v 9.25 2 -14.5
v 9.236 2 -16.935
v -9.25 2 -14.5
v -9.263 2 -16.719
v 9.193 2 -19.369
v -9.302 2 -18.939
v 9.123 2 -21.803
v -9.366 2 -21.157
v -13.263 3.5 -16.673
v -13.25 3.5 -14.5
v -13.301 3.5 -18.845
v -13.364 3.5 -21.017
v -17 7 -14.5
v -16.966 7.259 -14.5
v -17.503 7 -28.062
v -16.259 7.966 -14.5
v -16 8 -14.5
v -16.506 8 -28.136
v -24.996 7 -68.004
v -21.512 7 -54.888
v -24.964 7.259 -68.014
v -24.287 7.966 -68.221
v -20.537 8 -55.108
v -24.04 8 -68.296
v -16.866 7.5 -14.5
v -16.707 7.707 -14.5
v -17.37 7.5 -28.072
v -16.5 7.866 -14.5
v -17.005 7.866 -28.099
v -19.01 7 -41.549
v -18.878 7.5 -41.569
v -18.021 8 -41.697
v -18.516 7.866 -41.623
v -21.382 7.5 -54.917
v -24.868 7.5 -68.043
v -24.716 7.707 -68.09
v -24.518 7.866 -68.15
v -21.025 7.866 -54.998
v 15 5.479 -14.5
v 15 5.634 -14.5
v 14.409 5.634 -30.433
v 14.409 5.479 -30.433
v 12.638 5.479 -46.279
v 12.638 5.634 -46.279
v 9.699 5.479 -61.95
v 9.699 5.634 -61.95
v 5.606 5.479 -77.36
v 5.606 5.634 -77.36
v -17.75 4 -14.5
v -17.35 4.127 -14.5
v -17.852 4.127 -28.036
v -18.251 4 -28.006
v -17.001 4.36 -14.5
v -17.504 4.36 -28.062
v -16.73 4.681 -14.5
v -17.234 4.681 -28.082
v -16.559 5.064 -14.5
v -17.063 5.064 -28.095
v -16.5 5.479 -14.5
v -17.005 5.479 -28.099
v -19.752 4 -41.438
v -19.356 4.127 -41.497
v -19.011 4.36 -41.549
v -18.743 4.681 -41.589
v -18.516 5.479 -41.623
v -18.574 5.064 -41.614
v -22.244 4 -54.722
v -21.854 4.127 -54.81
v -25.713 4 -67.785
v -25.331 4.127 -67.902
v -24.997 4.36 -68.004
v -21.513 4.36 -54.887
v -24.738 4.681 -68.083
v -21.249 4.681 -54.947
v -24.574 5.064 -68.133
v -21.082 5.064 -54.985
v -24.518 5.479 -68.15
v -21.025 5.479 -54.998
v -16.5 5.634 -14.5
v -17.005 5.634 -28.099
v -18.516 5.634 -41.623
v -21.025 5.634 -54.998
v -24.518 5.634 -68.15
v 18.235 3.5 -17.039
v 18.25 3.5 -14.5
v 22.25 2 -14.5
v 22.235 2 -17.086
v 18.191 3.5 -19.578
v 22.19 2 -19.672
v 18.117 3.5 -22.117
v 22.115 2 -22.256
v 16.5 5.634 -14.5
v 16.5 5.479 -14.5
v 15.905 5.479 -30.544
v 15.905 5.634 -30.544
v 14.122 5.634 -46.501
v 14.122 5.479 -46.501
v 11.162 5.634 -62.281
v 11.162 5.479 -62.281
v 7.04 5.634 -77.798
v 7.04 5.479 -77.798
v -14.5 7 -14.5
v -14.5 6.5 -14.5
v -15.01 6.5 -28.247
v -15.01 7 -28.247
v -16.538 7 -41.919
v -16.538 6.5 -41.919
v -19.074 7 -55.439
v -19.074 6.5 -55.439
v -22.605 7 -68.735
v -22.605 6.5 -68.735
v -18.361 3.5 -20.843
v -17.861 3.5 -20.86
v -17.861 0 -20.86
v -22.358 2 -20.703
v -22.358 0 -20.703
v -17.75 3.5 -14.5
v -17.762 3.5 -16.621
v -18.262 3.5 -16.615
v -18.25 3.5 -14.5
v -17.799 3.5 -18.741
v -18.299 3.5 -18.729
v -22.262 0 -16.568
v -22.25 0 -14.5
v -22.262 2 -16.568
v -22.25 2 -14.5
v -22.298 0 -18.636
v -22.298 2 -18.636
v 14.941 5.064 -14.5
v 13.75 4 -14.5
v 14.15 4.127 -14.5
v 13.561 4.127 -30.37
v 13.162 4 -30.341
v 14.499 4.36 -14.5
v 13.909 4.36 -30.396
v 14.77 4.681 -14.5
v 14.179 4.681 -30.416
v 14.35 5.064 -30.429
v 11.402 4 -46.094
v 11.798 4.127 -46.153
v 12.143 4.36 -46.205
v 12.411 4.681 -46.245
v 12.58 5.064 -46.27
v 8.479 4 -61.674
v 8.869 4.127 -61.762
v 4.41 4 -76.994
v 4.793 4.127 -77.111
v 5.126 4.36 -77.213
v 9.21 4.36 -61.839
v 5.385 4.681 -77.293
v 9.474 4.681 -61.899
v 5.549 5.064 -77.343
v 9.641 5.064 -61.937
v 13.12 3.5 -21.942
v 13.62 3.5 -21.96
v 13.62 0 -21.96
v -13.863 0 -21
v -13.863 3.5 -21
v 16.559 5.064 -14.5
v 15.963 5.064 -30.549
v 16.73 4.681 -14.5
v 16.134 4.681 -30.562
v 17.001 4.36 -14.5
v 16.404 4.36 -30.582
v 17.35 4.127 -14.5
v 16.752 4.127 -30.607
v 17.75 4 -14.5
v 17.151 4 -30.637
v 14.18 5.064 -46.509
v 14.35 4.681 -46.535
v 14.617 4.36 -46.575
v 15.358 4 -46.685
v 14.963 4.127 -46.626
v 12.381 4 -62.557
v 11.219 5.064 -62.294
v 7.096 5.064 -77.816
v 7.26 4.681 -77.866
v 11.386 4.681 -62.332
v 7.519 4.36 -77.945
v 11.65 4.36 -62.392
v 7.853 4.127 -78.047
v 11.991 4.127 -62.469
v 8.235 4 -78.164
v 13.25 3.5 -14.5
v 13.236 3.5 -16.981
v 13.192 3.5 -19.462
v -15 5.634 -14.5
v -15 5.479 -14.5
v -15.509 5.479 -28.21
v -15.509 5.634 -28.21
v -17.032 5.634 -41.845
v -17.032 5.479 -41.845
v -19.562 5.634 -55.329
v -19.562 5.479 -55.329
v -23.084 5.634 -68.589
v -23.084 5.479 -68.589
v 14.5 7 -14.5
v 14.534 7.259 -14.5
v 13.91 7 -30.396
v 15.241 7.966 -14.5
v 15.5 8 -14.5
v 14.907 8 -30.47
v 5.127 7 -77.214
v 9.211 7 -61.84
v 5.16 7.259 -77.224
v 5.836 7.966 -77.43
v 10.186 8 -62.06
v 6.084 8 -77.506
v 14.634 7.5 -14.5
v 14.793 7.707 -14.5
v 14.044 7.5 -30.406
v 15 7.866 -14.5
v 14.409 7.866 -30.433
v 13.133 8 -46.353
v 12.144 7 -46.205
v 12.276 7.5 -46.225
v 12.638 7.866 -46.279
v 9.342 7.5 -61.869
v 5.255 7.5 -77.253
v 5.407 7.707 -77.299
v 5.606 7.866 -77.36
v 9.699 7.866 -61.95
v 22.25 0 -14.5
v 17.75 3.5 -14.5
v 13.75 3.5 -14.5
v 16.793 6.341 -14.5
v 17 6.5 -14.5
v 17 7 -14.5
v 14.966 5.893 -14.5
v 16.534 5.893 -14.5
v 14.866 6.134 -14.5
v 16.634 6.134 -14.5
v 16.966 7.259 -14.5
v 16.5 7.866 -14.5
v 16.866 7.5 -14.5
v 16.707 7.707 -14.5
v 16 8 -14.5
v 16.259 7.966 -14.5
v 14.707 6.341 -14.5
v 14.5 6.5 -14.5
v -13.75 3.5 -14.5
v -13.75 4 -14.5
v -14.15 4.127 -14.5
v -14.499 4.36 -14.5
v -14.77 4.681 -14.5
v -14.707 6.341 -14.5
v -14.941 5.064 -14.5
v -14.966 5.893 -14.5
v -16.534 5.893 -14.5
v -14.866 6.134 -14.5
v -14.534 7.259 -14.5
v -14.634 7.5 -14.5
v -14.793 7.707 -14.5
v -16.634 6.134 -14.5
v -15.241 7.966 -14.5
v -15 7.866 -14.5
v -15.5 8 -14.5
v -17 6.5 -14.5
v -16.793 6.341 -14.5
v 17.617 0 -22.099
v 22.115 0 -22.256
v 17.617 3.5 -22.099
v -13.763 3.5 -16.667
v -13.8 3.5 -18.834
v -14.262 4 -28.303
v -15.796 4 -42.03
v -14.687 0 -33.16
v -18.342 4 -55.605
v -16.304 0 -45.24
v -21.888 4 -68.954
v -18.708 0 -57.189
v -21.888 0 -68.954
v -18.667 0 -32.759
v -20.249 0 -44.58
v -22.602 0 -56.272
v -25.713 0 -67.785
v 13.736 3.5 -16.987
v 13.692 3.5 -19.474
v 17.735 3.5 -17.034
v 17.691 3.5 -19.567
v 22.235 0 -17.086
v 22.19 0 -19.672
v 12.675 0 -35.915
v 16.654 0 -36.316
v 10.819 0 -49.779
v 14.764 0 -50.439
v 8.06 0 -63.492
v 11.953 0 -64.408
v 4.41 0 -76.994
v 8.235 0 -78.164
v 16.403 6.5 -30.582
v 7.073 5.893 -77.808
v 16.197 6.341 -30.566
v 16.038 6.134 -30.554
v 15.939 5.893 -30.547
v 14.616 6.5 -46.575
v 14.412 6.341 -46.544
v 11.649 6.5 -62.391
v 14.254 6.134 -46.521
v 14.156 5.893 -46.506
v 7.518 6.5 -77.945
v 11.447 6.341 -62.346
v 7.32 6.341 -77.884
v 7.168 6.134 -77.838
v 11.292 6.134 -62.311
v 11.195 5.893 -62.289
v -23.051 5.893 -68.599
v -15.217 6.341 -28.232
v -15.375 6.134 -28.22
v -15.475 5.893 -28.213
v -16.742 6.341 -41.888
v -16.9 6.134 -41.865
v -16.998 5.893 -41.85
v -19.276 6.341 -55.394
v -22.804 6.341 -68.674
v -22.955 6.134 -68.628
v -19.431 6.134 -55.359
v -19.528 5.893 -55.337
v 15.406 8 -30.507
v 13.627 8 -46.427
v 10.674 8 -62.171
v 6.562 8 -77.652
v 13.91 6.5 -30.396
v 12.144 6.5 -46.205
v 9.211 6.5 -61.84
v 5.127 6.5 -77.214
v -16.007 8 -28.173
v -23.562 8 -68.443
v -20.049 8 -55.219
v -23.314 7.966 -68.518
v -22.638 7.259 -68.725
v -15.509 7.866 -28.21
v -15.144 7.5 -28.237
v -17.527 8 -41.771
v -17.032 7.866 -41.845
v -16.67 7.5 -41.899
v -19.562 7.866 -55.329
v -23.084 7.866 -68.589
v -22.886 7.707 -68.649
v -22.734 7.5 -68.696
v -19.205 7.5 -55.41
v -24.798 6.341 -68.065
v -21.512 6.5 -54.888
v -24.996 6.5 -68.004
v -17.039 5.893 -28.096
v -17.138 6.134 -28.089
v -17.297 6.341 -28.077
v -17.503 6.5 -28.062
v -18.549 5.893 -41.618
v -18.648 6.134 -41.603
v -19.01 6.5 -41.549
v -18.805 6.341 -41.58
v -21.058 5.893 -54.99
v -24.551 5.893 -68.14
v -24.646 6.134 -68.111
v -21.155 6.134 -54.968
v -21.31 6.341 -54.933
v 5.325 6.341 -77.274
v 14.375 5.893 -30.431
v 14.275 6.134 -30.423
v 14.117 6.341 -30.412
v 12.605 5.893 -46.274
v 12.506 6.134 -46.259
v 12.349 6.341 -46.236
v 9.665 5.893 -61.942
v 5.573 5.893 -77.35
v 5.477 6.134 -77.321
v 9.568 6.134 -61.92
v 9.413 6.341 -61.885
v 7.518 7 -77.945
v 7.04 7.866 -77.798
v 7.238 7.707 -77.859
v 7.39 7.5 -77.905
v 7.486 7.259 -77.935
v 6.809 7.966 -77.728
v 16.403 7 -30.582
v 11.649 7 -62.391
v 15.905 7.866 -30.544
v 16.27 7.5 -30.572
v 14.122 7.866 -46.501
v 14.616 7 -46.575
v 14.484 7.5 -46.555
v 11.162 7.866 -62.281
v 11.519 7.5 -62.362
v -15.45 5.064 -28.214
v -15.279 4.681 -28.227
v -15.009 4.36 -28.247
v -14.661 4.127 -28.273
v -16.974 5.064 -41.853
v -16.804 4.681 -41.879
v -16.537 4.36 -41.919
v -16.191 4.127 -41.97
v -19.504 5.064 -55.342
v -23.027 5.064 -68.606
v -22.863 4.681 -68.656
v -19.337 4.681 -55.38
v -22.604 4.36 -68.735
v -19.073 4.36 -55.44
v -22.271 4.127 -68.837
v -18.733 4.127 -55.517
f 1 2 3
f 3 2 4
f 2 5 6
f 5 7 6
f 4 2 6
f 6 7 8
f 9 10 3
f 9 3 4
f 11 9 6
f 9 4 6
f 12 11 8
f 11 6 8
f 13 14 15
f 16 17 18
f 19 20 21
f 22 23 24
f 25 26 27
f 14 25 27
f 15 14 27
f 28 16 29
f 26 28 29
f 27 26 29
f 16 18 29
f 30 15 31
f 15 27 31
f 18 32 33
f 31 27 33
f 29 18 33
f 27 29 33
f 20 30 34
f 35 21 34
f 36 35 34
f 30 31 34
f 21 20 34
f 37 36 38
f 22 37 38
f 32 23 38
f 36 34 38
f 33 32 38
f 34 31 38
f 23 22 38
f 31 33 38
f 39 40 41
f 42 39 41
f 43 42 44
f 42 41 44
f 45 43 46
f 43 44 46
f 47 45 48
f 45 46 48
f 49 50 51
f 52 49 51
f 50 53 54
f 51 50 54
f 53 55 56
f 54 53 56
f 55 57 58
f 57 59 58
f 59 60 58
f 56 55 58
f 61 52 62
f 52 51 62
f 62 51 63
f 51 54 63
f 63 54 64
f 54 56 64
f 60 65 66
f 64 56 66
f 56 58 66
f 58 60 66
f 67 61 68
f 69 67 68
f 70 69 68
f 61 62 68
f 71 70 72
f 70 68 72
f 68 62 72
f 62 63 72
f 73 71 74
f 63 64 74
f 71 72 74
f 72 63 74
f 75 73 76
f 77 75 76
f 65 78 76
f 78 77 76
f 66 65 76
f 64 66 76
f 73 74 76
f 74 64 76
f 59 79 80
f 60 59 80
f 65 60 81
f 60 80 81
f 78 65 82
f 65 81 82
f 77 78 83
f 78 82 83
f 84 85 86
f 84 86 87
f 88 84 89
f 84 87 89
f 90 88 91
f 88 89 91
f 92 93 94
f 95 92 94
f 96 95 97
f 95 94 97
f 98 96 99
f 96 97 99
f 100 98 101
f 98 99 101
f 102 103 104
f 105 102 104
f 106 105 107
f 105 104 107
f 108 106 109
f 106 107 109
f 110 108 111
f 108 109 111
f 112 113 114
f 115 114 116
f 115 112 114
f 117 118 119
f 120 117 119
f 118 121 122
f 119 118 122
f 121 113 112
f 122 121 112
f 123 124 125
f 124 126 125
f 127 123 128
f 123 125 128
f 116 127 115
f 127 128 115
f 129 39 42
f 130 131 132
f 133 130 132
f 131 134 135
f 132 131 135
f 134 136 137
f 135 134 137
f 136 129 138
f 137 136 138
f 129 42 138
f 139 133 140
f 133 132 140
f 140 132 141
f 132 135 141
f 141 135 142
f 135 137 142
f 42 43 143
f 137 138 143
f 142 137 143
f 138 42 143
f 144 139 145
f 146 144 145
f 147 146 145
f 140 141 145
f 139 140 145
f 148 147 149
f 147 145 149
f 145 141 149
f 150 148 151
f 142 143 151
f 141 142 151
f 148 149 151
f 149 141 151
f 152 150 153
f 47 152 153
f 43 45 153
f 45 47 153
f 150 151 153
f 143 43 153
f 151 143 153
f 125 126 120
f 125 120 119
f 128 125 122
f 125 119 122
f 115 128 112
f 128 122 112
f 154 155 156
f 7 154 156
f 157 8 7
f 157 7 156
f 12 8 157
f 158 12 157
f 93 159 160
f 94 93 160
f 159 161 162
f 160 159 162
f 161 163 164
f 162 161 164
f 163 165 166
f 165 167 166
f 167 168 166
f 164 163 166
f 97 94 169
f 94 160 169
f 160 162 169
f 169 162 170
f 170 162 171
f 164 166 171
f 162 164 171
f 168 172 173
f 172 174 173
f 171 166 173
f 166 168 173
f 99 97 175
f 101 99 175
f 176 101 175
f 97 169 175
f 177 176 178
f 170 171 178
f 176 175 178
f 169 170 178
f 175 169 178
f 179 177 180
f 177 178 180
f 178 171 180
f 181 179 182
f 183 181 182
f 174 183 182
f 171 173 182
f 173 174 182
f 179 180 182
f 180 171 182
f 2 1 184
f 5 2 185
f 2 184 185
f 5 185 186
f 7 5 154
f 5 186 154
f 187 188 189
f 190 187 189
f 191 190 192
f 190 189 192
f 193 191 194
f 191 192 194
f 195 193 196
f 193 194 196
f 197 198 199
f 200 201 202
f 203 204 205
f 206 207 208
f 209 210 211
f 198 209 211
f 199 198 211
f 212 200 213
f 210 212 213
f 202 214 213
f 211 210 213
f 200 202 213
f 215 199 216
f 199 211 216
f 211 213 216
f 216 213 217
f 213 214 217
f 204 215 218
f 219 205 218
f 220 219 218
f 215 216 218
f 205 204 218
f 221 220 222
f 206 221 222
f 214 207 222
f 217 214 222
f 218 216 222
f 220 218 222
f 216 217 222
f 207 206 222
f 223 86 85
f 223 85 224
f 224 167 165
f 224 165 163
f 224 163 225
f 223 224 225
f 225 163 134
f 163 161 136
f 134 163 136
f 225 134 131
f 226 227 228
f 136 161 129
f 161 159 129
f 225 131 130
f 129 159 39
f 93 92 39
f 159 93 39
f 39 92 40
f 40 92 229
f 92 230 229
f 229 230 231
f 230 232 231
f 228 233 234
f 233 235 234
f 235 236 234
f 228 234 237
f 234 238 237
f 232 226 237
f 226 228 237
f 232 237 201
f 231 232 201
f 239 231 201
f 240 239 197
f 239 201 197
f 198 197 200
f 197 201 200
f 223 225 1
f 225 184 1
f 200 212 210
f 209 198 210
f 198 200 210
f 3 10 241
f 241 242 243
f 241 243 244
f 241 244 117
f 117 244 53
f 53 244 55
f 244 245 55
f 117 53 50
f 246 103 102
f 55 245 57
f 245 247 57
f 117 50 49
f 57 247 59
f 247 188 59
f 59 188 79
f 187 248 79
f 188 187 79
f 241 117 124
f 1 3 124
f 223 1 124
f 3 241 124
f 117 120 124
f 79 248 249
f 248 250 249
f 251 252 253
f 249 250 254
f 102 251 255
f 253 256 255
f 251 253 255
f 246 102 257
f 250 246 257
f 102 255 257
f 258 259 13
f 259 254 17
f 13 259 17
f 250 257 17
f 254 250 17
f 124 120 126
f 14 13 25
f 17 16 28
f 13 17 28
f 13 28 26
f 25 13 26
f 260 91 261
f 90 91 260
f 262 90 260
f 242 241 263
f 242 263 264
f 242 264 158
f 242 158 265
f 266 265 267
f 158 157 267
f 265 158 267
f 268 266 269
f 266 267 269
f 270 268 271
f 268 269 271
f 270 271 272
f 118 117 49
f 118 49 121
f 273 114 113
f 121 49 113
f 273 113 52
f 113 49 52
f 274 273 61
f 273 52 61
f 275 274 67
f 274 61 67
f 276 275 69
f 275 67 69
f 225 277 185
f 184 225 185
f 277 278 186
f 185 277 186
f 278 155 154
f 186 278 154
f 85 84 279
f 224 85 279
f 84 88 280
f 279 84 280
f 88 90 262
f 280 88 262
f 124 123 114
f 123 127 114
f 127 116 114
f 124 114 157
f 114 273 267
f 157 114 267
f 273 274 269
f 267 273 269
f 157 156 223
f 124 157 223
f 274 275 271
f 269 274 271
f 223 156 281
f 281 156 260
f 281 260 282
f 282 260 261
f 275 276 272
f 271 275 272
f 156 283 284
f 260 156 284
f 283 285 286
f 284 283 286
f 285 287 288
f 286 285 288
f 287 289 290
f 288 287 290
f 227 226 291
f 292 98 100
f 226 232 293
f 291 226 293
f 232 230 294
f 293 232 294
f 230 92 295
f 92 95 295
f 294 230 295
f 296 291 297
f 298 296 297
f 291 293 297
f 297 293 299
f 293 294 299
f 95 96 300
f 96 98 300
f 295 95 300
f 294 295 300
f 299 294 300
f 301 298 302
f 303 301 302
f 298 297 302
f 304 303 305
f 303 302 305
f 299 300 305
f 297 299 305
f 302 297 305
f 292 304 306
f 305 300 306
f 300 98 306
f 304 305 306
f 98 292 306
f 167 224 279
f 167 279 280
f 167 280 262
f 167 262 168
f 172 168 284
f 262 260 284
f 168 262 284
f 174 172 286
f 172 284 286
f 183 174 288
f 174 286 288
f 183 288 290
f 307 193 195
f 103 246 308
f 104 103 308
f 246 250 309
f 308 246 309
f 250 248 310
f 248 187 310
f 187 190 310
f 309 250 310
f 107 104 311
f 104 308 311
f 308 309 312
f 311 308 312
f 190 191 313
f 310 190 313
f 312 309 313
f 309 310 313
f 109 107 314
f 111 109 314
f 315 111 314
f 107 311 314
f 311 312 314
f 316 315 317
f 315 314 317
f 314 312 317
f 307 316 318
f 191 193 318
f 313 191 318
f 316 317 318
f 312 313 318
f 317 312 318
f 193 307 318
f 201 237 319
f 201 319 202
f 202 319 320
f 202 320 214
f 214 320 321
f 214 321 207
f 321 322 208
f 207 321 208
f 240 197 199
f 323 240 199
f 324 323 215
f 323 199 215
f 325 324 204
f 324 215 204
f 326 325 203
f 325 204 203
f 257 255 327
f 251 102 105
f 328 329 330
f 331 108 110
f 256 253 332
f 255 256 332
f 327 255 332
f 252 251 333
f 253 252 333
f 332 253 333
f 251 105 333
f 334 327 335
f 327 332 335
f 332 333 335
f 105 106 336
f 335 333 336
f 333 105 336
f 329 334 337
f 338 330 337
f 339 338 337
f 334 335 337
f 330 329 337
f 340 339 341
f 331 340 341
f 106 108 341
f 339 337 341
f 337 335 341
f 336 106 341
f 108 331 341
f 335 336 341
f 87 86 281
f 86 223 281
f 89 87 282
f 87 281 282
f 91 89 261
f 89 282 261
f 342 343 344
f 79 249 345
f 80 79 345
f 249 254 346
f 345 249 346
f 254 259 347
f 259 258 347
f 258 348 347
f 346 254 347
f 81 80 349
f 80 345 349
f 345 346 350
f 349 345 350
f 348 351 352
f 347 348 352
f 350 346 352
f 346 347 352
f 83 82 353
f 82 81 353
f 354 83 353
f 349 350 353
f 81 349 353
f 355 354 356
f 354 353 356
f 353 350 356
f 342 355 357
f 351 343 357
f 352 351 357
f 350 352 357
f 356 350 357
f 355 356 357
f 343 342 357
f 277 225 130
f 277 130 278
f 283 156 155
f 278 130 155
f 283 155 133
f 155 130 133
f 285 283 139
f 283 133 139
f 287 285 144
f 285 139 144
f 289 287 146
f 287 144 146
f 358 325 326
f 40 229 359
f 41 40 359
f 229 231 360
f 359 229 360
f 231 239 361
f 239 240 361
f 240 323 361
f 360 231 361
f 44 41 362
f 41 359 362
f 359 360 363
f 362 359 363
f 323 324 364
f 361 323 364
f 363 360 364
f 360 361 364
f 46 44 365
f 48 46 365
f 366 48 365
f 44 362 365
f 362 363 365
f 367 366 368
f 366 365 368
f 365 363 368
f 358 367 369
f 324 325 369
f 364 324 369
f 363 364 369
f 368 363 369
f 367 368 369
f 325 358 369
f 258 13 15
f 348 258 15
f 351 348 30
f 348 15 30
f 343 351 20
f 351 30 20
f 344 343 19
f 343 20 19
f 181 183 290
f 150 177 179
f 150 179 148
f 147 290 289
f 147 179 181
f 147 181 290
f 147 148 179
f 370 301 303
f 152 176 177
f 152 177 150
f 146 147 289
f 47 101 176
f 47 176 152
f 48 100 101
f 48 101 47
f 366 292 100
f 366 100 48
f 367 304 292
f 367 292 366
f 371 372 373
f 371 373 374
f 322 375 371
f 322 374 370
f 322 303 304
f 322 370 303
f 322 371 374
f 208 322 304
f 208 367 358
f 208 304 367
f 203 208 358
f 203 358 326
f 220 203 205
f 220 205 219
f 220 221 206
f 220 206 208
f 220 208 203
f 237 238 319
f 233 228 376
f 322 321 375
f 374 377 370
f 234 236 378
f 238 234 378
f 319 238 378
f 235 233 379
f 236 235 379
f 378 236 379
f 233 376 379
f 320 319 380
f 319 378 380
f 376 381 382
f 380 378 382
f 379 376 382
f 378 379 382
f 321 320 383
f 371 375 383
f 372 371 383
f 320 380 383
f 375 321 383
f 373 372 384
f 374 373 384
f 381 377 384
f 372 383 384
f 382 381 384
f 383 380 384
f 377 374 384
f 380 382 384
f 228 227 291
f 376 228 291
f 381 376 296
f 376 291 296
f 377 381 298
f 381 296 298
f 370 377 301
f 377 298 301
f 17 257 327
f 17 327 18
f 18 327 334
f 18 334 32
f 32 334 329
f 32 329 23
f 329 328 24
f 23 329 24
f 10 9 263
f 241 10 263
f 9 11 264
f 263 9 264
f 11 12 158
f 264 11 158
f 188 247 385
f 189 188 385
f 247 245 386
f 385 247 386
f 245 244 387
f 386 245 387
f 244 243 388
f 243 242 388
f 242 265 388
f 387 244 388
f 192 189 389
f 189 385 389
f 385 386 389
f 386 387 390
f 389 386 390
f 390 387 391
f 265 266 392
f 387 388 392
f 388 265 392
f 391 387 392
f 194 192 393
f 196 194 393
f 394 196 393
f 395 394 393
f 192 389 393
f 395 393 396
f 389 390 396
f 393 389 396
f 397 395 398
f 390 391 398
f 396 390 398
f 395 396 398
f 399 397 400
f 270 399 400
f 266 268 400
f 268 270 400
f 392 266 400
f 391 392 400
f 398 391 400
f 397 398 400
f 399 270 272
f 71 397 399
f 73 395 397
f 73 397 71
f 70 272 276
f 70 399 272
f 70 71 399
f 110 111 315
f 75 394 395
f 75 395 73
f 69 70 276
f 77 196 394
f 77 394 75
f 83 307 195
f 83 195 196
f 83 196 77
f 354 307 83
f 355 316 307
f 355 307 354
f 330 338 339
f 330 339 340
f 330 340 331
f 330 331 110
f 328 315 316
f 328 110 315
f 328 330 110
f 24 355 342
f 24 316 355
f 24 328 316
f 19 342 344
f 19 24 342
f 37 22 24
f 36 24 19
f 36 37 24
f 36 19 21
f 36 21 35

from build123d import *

# Parameters (mm, degrees)
SKETCH_1_W          = 4
SKETCH_1_H          = 21
SKETCH_1_H_2        = 8
EXTRUDE_1_DEPTH     = 4
SKETCH_1_7_W        = 44.5
SKETCH_1_7_H        = 8
EXTRUDE_2_DEPTH     = 3.5
SKETCH_2_W          = 18.5
SKETCH_2_H          = 1.5
CUT_EXTRUDE_1_DEPTH = 37.7704025
SKETCH_2_3_W        = 2.5
SKETCH_2_3_H        = 1.5
EXTRUDE_4_DEPTH     = 29
FILLET_1_R          = 1
FILLET_2_R          = 1.5
FILLET_3_R          = 1
REVOLVE_2_ANGLE     = 17
CUT_EXTRUDE_5_DEPTH = 70.125096927
REVOLVE_1_ANGLE     = 2


with BuildPart() as part:
    # 草图1 → 凸台-拉伸1 (new body)
    with BuildSketch(Plane(origin=(0, 0, 0), x_dir=(1, 0, 0), z_dir=(0, 1, 0))):
        with Locations((-15.75, -4)):
            Rectangle(SKETCH_1_W, SKETCH_1_H)
        with Locations((15.75, -4)):
            Rectangle(SKETCH_1_W, SKETCH_1_H)
        with Locations((15.75, 10.5)):
            Rectangle(SKETCH_1_W, SKETCH_1_H_2)
        with Locations((-15.75, 10.5)):
            Rectangle(SKETCH_1_W, SKETCH_1_H_2)
    extrude(amount=EXTRUDE_1_DEPTH)

    # 草图1<7> → 凸台-拉伸2 (add)
    with BuildSketch(Plane(origin=(0, 0, 0), x_dir=(1, 0, 0), z_dir=(0, 1, 0))):
        with Locations((0, 10.5)):
            Rectangle(SKETCH_1_7_W, SKETCH_1_7_H)
    extrude(amount=EXTRUDE_2_DEPTH)

    # 草图2 → 切除-拉伸1 (cut, through all)
    with BuildSketch(Plane(origin=(0, 0, -14.5), x_dir=(-1, 0, 0), z_dir=(0, 0, -1))):
        with Locations((0, 2.75)):
            Rectangle(SKETCH_2_W, SKETCH_2_H)
        Polygon((13.25, 3.5), (9.25, 3.5), (9.25, 2), align=None)
        Polygon((-9.25, 3.5), (-13.25, 3.5), (-9.25, 2), align=None)
        Polygon((-22.25, 3.5), (-22.25, 2), (-18.25, 3.5), align=None)
        Polygon((22.25, 3.5), (18.25, 3.5), (22.25, 2), align=None)
    extrude(amount=-CUT_EXTRUDE_1_DEPTH, mode=Mode.SUBTRACT)

    # 草图2<3> → 凸台-拉伸4 (add, through all)
    with BuildSketch(Plane(origin=(0, 0, -14.5), x_dir=(-1, 0, 0), z_dir=(0, 0, -1))):
        with Locations((-15.75, 7.25)):
            Rectangle(SKETCH_2_3_W, SKETCH_2_3_H)
        Polygon((-15, 6.5), (-16.5, 6.5), (-16.5, 4), (-15.75, 4), (-15, 4), align=None)
        with Locations((15.75, 7.25)):
            Rectangle(SKETCH_2_3_W, SKETCH_2_3_H)
        Polygon((16.5, 6.5), (15, 6.5), (15, 4), (15.75, 4), (16.5, 4), align=None)
    extrude(amount=-EXTRUDE_4_DEPTH)

    # 圆角1
    # the kernel refuses this fillet: 1 mm, written as the material it adds along each edge
    with BuildSketch(Plane(origin=(-16.5, 6.5, -14.5), x_dir=(-1, 0, 0), z_dir=(0, 0, 1)), Plane(origin=(15, 6.5, -14.5), x_dir=(-1, 0, 0), z_dir=(0, 0, 1))) as fillet_1_piece_1:
        with BuildLine():
            CenterArc((1, 0.866025404), FILLET_1_R, 180, 60)
            Line((0, 0.866025404), (-0.02, 0.866025404))
            Line((-0.02, 0.866025404), (-0.02, 0))
            Line((-0.02, 0), (0, -0.02))
            ThreePointArc((0, -0.02), (0.25, -0.02), (0.49, -0.017320508))
            Line((0.49, -0.017320508), (0.5, 0))
        make_face()
    extrude(amount=29)
    with BuildSketch(Plane(origin=(-15, 6.5, -14.5), x_dir=(0, -1, 0), z_dir=(0, 0, 1)), Plane(origin=(16.5, 6.5, -14.5), x_dir=(0, -1, 0), z_dir=(0, 0, 1))) as fillet_1_piece_2:
        with BuildLine():
            CenterArc((0.866025404, 1), FILLET_1_R, 210, 60)
            Line((0, 0.5), (-0.017320508, 0.49))
            ThreePointArc((-0.017320508, 0.49), (-0.02, 0.25), (-0.02, 0))
            Line((-0.02, 0), (0, -0.02))
            Line((0, -0.02), (0.866025404, -0.02))
            Line((0.866025404, -0.02), (0.866025404, 0))
        make_face()
    extrude(amount=29)

    # 圆角2
    # the kernel refuses this fillet: 1.5 mm, written as the material it adds along each edge
    with BuildSketch(Plane(origin=(16.5, 4, -14.5), x_dir=(1, 0, 0), z_dir=(0, 0, 1))) as fillet_2_piece_1:
        with BuildLine():
            CenterArc((1.5, 1.479019946), FILLET_2_R, 180, 80.405931773)
            Line((0, 1.479019946), (-0.03, 1.479019946))
            Line((-0.03, 1.479019946), (-0.03, 0))
            Line((-0.03, 0), (0, -0.03))
            ThreePointArc((0, -0.03), (0.625, -0.03), (1.245, -0.029580399))
            Line((1.245, -0.029580399), (1.25, 0))
        make_face()
    extrude(amount=29)
    with BuildSketch(Plane(origin=(15, 4, -14.5), x_dir=(0, 1, 0), z_dir=(0, 0, 1)), Plane(origin=(-16.5, 4, -14.5), x_dir=(0, 1, 0), z_dir=(0, 0, 1))) as fillet_2_piece_2:
        with BuildLine():
            CenterArc((1.479019946, 1.5), FILLET_2_R, 189.594068227, 80.405931773)
            Line((0, 1.25), (-0.029580399, 1.245))
            ThreePointArc((-0.029580399, 1.245), (-0.03, 0.625), (-0.03, 0))
            Line((-0.03, 0), (0, -0.03))
            Line((0, -0.03), (1.479019946, -0.03))
            Line((1.479019946, -0.03), (1.479019946, 0))
        make_face()
    extrude(amount=29)
    with BuildSketch(Plane(origin=(-15, 4, -14.5), x_dir=(0, 1, 0), z_dir=(0, 0, 1))) as fillet_2_piece_3:
        with BuildLine():
            CenterArc((1.479019946, -1.5), FILLET_2_R, 90, 80.405931773)
            Line((0, -1.25), (-0.029580399, -1.245))
            ThreePointArc((-0.029580399, -1.245), (-0.03, -0.625), (-0.03, 0))
            Line((-0.03, 0), (0, 0.03))
            Line((0, 0.03), (1.479019946, 0.03))
            Line((1.479019946, 0.03), (1.479019946, 0))
        make_face()
    extrude(amount=29)

    # 圆角3
    fillet_3_edges = [part.edges().sort_by_distance(p)[0] for p in [
        (14.5, 8, 0),
        (17, 8, 0),
        (-17, 8, 0),
        (-14.5, 8, 0),
    ]]
    fillet(fillet_3_edges, radius=FILLET_3_R)

    # 草图7 → 旋转2 (revolve)
    with BuildSketch(Plane(origin=(0, 0, -14.5), x_dir=(-1, 0, 0), z_dir=(0, 0, -1))):
        with BuildLine():
            Line((-17.75, 3.5), (-17.75, 0))
            Line((-17.75, 0), (-13.75, 0))
            Line((-13.75, 0), (-13.75, 3.5))
            Line((-13.75, 3.5), (-13.75, 4))
            ThreePointArc((-13.75, 4), (-14.645643924, 4.510774109), (-15, 5.479019946))
            Line((-15, 5.479019946), (-15, 5.633974596))
            ThreePointArc((-15, 5.633974596), (-14.866025404, 6.133974596), (-14.5, 6.5))
            Line((-14.5, 6.5), (-14.5, 7))
            ThreePointArc((-14.5, 7), (-14.792893219, 7.707106781), (-15.5, 8))
            Line((-15.5, 8), (-16, 8))
            ThreePointArc((-16, 8), (-16.707106781, 7.707106781), (-17, 7))
            Line((-17, 7), (-17, 6.5))
            ThreePointArc((-17, 6.5), (-16.633974596, 6.133974596), (-16.5, 5.633974596))
            Line((-16.5, 5.633974596), (-16.5, 5.479019946))
            ThreePointArc((-16.5, 5.479019946), (-16.854356076, 4.510774109), (-17.75, 4))
            Line((-17.75, 4), (-17.75, 3.5))
        make_face()
        with BuildLine():
            Line((13.75, 3.5), (13.75, 0))
            Line((13.75, 0), (17.75, 0))
            Line((17.75, 0), (17.75, 3.5))
            Line((17.75, 3.5), (17.75, 4))
            ThreePointArc((17.75, 4), (16.854356076, 4.510774109), (16.5, 5.479019946))
            Line((16.5, 5.479019946), (16.5, 5.633974596))
            ThreePointArc((16.5, 5.633974596), (16.633974596, 6.133974596), (17, 6.5))
            Line((17, 6.5), (17, 7))
            ThreePointArc((17, 7), (16.707106781, 7.707106781), (16, 8))
            Line((16, 8), (15.5, 8))
            ThreePointArc((15.5, 8), (14.792893219, 7.707106781), (14.5, 7))
            Line((14.5, 7), (14.5, 6.5))
            ThreePointArc((14.5, 6.5), (14.866025404, 6.133974596), (15, 5.633974596))
            Line((15, 5.633974596), (15, 5.479019946))
            ThreePointArc((15, 5.479019946), (14.645643924, 4.510774109), (13.75, 4))
            Line((13.75, 4), (13.75, 3.5))
        make_face()
    revolve(axis=Axis((-200, 10, -14.5), (0, 1, 0)), revolution_arc=REVOLVE_2_ANGLE)

    # 草图5<2> → 切除-拉伸5 (cut, through all)
    with BuildSketch(Plane(origin=(0, 0, -14.5), x_dir=(-1, 0, 0), z_dir=(0, 0, -1))):
        with BuildLine():
            Line((17, 6.5), (17, 7))
            ThreePointArc((17, 7), (16.707106781, 7.707106781), (16, 8))
            Line((16, 8), (15.5, 8))
            ThreePointArc((15.5, 8), (14.792893219, 7.707106781), (14.5, 7))
            Line((14.5, 7), (14.5, 6.5))
            ThreePointArc((14.5, 6.5), (14.866025404, 6.133974596), (15, 5.633974596))
            Line((15, 5.633974596), (15, 5.479019946))
            ThreePointArc((15, 5.479019946), (14.645643924, 4.510774109), (13.75, 4))
            Line((13.75, 4), (13.75, 3.5))
            Line((13.75, 3.5), (13.25, 3.5))
            Line((13.25, 3.5), (9.25, 2))
            Line((9.25, 2), (-9.25, 2))
            Line((-9.25, 2), (-13.25, 3.5))
            Line((-13.25, 3.5), (-13.75, 3.5))
            Line((-13.75, 3.5), (-13.75, 4))
            ThreePointArc((-13.75, 4), (-14.645643924, 4.510774109), (-15, 5.479019946))
            Line((-15, 5.479019946), (-15, 5.633974596))
            ThreePointArc((-15, 5.633974596), (-14.866025404, 6.133974596), (-14.5, 6.5))
            Line((-14.5, 6.5), (-14.5, 7))
            ThreePointArc((-14.5, 7), (-14.792893219, 7.707106781), (-15.5, 8))
            Line((-15.5, 8), (-16, 8))
            ThreePointArc((-16, 8), (-16.707106781, 7.707106781), (-17, 7))
            Line((-17, 7), (-17, 6.5))
            ThreePointArc((-17, 6.5), (-16.633974596, 6.133974596), (-16.5, 5.633974596))
            Line((-16.5, 5.633974596), (-16.5, 5.479019946))
            ThreePointArc((-16.5, 5.479019946), (-16.854356076, 4.510774109), (-17.75, 4))
            Line((-17.75, 4), (-17.75, 3.5))
            Line((-17.75, 3.5), (-18.25, 3.5))
            Line((-18.25, 3.5), (-22.25, 2))
            Line((-22.25, 2), (-22.25, 0))
            Line((-22.25, 0), (22.25, 0))
            Line((22.25, 0), (22.25, 2))
            Line((22.25, 2), (18.25, 3.5))
            Line((18.25, 3.5), (17.75, 3.5))
            Line((17.75, 3.5), (17.75, 4))
            ThreePointArc((17.75, 4), (16.854356076, 4.510774109), (16.5, 5.479019946))
            Line((16.5, 5.479019946), (16.5, 5.633974596))
            ThreePointArc((16.5, 5.633974596), (16.633974596, 6.133974596), (17, 6.5))
        make_face()
    extrude(amount=-CUT_EXTRUDE_5_DEPTH, mode=Mode.SUBTRACT)


with BuildPart() as cut_extrude_5_piece_1:
    # of the separate pieces the step leaves, piece 1, a body of its own (cut_extrude_5_pieces)
    add(part.part.solids().sort_by_distance((13.75, 0, -14.5))[0])



with BuildPart() as cut_extrude_5_piece_2:
    # of the separate pieces the step leaves, piece 2, a body of its own (cut_extrude_5_pieces)
    add(part.part.solids().sort_by_distance((-13.75, 4, -14.5))[0])


with BuildPart() as cut_extrude_5_piece_1_1:
    add(cut_extrude_5_piece_1.part)

    add(cut_extrude_5_piece_2.part)  # 旋转1 merges 切除-拉伸5 piece 2
    # 草图5 → 旋转1 (revolve)
    with BuildSketch(Plane(origin=(0, 0, -14.5), x_dir=(-1, 0, 0), z_dir=(0, 0, -1))):
        with BuildLine():
            Line((17, 6.5), (17, 7))
            ThreePointArc((17, 7), (16.707106781, 7.707106781), (16, 8))
            Line((16, 8), (15.5, 8))
            ThreePointArc((15.5, 8), (14.792893219, 7.707106781), (14.5, 7))
            Line((14.5, 7), (14.5, 6.5))
            ThreePointArc((14.5, 6.5), (14.866025404, 6.133974596), (15, 5.633974596))
            Line((15, 5.633974596), (15, 5.479019946))
            ThreePointArc((15, 5.479019946), (14.645643924, 4.510774109), (13.75, 4))
            Line((13.75, 4), (13.75, 3.5))
            Line((13.75, 3.5), (13.25, 3.5))
            Line((13.25, 3.5), (9.25, 2))
            Line((9.25, 2), (-9.25, 2))
            Line((-9.25, 2), (-13.25, 3.5))
            Line((-13.25, 3.5), (-13.75, 3.5))
            Line((-13.75, 3.5), (-13.75, 4))
            ThreePointArc((-13.75, 4), (-14.645643924, 4.510774109), (-15, 5.479019946))
            Line((-15, 5.479019946), (-15, 5.633974596))
            ThreePointArc((-15, 5.633974596), (-14.866025404, 6.133974596), (-14.5, 6.5))
            Line((-14.5, 6.5), (-14.5, 7))
            ThreePointArc((-14.5, 7), (-14.792893219, 7.707106781), (-15.5, 8))
            Line((-15.5, 8), (-16, 8))
            ThreePointArc((-16, 8), (-16.707106781, 7.707106781), (-17, 7))
            Line((-17, 7), (-17, 6.5))
            ThreePointArc((-17, 6.5), (-16.633974596, 6.133974596), (-16.5, 5.633974596))
            Line((-16.5, 5.633974596), (-16.5, 5.479019946))
            ThreePointArc((-16.5, 5.479019946), (-16.854356076, 4.510774109), (-17.75, 4))
            Line((-17.75, 4), (-17.75, 3.5))
            Line((-17.75, 3.5), (-18.25, 3.5))
            Line((-18.25, 3.5), (-22.25, 2))
            Line((-22.25, 2), (-22.25, 0))
            Line((-22.25, 0), (22.25, 0))
            Line((22.25, 0), (22.25, 2))
            Line((22.25, 2), (18.25, 3.5))
            Line((18.25, 3.5), (17.75, 3.5))
            Line((17.75, 3.5), (17.75, 4))
            ThreePointArc((17.75, 4), (16.854356076, 4.510774109), (16.5, 5.479019946))
            Line((16.5, 5.479019946), (16.5, 5.633974596))
            ThreePointArc((16.5, 5.633974596), (16.633974596, 6.133974596), (17, 6.5))
        make_face()
    revolve(axis=Axis((-200, 10, -14.5), (0, 1, 0)), revolution_arc=REVOLVE_1_ANGLE)


solid = cut_extrude_5_piece_1_1.part
